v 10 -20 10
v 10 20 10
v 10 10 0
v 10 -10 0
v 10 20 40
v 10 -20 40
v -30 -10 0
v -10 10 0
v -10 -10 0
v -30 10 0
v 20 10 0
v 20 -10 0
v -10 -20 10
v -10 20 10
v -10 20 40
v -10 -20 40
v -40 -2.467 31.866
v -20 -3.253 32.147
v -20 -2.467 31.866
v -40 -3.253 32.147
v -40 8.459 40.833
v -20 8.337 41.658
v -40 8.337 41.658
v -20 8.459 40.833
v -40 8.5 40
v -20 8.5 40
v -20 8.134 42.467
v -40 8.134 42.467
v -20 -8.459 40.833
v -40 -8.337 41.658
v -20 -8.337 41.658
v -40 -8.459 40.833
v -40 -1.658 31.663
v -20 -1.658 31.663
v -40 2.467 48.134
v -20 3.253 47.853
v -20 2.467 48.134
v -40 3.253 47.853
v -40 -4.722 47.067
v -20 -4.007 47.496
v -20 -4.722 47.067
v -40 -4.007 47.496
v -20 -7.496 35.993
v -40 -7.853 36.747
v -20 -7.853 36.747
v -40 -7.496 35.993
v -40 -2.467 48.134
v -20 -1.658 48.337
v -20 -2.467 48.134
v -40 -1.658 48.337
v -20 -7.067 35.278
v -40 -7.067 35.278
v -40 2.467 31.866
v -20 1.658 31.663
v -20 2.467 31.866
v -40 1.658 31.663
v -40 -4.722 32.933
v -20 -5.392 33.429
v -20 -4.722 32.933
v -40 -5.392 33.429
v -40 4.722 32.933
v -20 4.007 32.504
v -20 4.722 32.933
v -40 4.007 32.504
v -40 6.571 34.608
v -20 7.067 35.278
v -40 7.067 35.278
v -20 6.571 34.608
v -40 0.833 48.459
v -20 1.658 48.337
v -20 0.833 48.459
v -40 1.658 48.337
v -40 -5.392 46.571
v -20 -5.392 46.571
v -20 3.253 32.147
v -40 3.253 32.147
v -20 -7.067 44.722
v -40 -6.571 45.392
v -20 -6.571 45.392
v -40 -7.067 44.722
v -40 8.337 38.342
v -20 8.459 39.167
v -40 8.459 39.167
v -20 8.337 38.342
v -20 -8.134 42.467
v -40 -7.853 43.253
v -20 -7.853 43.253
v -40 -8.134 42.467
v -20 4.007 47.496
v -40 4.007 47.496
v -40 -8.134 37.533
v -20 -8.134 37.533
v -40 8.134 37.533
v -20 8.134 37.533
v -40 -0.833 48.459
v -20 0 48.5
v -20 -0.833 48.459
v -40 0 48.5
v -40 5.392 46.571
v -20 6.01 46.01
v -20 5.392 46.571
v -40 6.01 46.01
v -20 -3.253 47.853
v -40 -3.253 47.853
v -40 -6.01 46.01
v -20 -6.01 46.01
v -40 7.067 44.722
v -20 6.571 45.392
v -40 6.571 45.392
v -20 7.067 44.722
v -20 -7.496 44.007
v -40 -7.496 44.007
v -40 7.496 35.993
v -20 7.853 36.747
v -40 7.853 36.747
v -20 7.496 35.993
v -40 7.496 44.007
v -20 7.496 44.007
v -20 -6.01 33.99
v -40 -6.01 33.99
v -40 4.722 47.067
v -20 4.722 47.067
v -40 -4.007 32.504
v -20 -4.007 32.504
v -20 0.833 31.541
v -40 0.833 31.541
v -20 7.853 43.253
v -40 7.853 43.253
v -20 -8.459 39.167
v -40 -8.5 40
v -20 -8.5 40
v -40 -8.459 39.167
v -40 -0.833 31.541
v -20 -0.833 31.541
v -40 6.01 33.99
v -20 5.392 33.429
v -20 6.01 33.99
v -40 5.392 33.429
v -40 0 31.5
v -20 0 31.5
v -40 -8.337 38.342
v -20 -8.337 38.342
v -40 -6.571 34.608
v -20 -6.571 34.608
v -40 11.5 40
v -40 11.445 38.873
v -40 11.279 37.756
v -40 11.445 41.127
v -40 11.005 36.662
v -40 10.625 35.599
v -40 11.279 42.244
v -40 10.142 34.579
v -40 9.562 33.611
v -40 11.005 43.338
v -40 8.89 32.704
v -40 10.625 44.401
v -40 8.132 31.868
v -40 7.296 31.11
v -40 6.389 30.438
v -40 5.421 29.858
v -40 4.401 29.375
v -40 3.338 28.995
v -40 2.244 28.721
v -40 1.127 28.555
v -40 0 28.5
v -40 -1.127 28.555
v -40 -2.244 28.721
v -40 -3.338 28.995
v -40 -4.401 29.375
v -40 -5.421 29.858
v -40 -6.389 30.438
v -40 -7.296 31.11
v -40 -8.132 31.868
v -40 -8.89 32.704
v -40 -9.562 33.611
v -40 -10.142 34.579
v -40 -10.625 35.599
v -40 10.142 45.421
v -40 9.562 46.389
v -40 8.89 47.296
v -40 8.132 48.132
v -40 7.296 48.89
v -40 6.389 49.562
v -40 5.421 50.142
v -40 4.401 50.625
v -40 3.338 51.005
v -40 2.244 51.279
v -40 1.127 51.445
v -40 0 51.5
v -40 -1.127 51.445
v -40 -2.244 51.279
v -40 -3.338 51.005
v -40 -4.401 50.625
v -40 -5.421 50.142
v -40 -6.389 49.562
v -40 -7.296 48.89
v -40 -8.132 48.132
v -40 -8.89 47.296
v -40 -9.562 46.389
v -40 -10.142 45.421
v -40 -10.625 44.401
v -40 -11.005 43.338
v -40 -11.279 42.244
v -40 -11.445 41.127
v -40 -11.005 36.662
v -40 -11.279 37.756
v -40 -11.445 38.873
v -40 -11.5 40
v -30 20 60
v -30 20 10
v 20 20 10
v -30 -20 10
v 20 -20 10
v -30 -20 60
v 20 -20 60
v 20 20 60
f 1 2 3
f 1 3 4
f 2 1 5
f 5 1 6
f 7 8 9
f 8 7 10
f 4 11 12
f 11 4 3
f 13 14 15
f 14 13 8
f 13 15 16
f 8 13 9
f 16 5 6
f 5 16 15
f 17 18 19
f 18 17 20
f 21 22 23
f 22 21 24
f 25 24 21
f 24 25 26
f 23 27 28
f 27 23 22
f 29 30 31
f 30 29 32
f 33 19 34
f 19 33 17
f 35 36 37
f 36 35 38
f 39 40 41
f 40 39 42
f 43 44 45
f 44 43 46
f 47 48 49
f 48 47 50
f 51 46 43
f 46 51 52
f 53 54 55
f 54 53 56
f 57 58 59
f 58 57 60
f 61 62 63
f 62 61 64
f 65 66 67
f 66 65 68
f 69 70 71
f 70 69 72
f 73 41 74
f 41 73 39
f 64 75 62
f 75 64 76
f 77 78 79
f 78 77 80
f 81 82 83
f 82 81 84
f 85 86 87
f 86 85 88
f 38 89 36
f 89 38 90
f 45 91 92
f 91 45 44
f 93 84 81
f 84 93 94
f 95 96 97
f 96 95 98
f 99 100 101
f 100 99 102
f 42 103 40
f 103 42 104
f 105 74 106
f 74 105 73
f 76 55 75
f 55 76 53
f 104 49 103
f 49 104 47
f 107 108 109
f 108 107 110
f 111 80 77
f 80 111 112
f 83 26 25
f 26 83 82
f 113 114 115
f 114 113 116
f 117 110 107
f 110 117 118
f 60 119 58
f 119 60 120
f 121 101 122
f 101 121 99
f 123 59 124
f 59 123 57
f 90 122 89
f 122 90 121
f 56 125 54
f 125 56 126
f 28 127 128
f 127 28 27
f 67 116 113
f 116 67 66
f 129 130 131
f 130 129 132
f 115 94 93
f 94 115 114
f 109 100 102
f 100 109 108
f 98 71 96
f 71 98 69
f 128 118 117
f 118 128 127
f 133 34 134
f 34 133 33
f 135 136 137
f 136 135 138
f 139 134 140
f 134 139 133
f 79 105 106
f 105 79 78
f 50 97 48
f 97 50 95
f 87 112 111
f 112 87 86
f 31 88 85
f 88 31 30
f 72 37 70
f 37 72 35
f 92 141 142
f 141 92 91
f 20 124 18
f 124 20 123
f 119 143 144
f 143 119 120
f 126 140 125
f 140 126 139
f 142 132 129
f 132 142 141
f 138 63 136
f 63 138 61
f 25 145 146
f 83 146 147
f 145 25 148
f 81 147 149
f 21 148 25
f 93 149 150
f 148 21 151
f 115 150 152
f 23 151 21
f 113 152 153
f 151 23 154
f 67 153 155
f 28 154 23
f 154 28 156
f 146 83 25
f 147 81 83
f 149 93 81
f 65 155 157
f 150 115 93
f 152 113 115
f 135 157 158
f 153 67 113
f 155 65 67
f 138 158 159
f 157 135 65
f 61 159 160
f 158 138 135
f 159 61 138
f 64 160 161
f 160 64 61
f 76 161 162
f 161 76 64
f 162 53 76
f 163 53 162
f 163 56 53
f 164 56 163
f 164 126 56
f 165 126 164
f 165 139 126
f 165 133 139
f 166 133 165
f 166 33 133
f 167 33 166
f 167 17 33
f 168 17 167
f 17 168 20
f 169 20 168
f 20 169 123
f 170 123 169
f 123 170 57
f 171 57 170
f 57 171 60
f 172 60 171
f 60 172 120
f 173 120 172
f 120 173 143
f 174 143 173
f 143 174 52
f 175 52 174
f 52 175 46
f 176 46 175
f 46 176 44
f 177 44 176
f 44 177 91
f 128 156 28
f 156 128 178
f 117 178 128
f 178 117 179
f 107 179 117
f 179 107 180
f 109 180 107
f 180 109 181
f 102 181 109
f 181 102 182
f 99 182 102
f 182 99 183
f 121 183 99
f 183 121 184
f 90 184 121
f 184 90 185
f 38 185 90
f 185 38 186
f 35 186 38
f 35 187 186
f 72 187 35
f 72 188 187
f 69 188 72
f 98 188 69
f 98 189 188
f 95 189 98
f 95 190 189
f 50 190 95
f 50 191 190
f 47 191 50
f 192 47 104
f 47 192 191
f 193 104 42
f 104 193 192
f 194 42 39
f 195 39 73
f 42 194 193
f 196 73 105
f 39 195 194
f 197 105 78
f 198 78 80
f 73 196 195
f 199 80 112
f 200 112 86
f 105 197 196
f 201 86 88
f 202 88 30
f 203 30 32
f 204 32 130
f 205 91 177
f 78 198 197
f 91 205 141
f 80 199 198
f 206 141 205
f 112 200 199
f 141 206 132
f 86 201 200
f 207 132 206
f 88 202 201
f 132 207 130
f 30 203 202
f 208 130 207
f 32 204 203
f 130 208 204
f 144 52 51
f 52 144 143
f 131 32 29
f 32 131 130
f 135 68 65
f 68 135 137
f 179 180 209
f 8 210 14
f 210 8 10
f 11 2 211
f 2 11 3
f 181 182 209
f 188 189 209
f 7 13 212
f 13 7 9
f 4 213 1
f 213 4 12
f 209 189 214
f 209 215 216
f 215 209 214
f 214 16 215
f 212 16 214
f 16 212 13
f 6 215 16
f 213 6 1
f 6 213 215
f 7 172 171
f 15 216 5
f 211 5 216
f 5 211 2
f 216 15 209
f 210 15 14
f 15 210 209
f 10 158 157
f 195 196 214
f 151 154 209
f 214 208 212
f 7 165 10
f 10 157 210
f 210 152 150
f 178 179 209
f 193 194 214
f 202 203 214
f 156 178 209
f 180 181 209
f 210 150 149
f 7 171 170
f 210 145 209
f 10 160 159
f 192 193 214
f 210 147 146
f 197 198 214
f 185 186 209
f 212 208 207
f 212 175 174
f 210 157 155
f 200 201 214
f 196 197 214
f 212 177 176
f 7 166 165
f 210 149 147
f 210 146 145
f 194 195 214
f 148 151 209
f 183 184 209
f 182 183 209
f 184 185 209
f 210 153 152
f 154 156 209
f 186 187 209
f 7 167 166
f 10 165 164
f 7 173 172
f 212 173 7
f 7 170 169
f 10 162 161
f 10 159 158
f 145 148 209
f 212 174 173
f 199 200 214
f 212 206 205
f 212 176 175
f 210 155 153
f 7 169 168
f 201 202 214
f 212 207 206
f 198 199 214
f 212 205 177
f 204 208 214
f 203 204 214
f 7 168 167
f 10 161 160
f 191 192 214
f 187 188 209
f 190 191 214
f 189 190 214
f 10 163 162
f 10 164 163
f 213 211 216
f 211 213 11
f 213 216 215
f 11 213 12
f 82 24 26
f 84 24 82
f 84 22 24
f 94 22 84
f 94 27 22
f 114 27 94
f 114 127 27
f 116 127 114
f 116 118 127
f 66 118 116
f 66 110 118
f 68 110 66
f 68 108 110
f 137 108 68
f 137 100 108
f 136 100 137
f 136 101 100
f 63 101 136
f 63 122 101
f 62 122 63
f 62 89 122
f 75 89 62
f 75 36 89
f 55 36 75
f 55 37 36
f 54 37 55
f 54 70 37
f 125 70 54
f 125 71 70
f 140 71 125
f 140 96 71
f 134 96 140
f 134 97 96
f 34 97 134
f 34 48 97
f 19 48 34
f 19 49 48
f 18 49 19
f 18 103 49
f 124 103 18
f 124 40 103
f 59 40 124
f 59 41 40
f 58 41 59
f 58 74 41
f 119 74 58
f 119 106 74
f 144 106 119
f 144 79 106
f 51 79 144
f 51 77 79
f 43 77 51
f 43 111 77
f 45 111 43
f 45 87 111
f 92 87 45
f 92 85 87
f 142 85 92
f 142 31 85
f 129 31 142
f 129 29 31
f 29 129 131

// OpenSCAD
$BRICK_SIZE = 20;

$TUBE_DIAMETER = 17;
$WIDTH_OUT_TUBE = $BRICK_SIZE-$TUBE_DIAMETER;
$fn=64;

module brick(x,y,z) {
    translate([x*$BRICK_SIZE,y*$BRICK_SIZE,z*$BRICK_SIZE]) {
        cube($BRICK_SIZE);
    }   
}

module cover_brick(x,y,z) {
    translate([x*$BRICK_SIZE,y*$BRICK_SIZE,z*$BRICK_SIZE]) {
        cube($BRICK_SIZE+3);
    }   
}

module intube(height) {
        cylinder(r=$TUBE_DIAMETER/2, h=height);
}

module outtube(height) {
        cylinder(r=$TUBE_DIAMETER/2+$WIDTH_OUT_TUBE, h=height);
}


module underbar() {
    brick(-0.5,-0.5,0);
    brick(-0.5,-0.5,1);
    
    brick(-0.5,-1.5,0);
    brick(-0.5,-1.5,1);
    
    brick(-0.5,0.5,0);
    brick(-0.5,0.5,1);
}

module b1() {
    difference() {
        union() {
            brick(0.5,-0.5,0);
            brick(0.5,-0.5,1);
            brick(0.5,-0.5,1.5);

            brick(-0.5,-0.5,2);

            brick(-1.5,-0.5,0);
            brick(-1.5,-0.5,1);
            brick(-1.5,-0.5,2);
        }
        

    }
}   

module b2() {
    difference() {
        union() {
            brick(0.5,-1,0.5);
            brick(0.5,-1,1);
            brick(0.5,-1,2);

            brick(-0.5,-1,2);

            brick(-1.5,-1,0.5);
            brick(-1.5,-1,1);
            brick(-1.5,-1,2);
        }

    }
}   


module b3() {
    difference() {
        union() {
            brick(0.5,0,0.5);
            brick(0.5,0,1);
            brick(0.5,0,2);

            brick(-0.5,0,2);

            brick(-1.5,0,0.5);
            brick(-1.5,0,1);
            brick(-1.5,0,2);
        }
        

    }
}   


module holder(rotation) {
  translate([-$BRICK_SIZE*2, 0, $BRICK_SIZE*2]) {
        rotate(rotation){
                outtube(80);
        }
    }
}


module holderin(rotation) {
  translate([-$BRICK_SIZE*2, 0, $BRICK_SIZE*2]) {
        rotate(rotation){
                intube(80);
        }
    }
}


difference() {
union() {
difference() {
    hull() {
        b1();
        b2();
        b3();
        holder([90,0,90]);
    }
    
    union(){
        holderin([90,0,90]);
        underbar();
    }
}

        // pared interior para que no escape la barra
        difference() {
            scale([2,1,1]) brick(-0.5,-0.5,1.5);
            brick(-0.5,-0.5,1);
        }

    }

    translate([20,-50,0]) { cube(100); }
}
